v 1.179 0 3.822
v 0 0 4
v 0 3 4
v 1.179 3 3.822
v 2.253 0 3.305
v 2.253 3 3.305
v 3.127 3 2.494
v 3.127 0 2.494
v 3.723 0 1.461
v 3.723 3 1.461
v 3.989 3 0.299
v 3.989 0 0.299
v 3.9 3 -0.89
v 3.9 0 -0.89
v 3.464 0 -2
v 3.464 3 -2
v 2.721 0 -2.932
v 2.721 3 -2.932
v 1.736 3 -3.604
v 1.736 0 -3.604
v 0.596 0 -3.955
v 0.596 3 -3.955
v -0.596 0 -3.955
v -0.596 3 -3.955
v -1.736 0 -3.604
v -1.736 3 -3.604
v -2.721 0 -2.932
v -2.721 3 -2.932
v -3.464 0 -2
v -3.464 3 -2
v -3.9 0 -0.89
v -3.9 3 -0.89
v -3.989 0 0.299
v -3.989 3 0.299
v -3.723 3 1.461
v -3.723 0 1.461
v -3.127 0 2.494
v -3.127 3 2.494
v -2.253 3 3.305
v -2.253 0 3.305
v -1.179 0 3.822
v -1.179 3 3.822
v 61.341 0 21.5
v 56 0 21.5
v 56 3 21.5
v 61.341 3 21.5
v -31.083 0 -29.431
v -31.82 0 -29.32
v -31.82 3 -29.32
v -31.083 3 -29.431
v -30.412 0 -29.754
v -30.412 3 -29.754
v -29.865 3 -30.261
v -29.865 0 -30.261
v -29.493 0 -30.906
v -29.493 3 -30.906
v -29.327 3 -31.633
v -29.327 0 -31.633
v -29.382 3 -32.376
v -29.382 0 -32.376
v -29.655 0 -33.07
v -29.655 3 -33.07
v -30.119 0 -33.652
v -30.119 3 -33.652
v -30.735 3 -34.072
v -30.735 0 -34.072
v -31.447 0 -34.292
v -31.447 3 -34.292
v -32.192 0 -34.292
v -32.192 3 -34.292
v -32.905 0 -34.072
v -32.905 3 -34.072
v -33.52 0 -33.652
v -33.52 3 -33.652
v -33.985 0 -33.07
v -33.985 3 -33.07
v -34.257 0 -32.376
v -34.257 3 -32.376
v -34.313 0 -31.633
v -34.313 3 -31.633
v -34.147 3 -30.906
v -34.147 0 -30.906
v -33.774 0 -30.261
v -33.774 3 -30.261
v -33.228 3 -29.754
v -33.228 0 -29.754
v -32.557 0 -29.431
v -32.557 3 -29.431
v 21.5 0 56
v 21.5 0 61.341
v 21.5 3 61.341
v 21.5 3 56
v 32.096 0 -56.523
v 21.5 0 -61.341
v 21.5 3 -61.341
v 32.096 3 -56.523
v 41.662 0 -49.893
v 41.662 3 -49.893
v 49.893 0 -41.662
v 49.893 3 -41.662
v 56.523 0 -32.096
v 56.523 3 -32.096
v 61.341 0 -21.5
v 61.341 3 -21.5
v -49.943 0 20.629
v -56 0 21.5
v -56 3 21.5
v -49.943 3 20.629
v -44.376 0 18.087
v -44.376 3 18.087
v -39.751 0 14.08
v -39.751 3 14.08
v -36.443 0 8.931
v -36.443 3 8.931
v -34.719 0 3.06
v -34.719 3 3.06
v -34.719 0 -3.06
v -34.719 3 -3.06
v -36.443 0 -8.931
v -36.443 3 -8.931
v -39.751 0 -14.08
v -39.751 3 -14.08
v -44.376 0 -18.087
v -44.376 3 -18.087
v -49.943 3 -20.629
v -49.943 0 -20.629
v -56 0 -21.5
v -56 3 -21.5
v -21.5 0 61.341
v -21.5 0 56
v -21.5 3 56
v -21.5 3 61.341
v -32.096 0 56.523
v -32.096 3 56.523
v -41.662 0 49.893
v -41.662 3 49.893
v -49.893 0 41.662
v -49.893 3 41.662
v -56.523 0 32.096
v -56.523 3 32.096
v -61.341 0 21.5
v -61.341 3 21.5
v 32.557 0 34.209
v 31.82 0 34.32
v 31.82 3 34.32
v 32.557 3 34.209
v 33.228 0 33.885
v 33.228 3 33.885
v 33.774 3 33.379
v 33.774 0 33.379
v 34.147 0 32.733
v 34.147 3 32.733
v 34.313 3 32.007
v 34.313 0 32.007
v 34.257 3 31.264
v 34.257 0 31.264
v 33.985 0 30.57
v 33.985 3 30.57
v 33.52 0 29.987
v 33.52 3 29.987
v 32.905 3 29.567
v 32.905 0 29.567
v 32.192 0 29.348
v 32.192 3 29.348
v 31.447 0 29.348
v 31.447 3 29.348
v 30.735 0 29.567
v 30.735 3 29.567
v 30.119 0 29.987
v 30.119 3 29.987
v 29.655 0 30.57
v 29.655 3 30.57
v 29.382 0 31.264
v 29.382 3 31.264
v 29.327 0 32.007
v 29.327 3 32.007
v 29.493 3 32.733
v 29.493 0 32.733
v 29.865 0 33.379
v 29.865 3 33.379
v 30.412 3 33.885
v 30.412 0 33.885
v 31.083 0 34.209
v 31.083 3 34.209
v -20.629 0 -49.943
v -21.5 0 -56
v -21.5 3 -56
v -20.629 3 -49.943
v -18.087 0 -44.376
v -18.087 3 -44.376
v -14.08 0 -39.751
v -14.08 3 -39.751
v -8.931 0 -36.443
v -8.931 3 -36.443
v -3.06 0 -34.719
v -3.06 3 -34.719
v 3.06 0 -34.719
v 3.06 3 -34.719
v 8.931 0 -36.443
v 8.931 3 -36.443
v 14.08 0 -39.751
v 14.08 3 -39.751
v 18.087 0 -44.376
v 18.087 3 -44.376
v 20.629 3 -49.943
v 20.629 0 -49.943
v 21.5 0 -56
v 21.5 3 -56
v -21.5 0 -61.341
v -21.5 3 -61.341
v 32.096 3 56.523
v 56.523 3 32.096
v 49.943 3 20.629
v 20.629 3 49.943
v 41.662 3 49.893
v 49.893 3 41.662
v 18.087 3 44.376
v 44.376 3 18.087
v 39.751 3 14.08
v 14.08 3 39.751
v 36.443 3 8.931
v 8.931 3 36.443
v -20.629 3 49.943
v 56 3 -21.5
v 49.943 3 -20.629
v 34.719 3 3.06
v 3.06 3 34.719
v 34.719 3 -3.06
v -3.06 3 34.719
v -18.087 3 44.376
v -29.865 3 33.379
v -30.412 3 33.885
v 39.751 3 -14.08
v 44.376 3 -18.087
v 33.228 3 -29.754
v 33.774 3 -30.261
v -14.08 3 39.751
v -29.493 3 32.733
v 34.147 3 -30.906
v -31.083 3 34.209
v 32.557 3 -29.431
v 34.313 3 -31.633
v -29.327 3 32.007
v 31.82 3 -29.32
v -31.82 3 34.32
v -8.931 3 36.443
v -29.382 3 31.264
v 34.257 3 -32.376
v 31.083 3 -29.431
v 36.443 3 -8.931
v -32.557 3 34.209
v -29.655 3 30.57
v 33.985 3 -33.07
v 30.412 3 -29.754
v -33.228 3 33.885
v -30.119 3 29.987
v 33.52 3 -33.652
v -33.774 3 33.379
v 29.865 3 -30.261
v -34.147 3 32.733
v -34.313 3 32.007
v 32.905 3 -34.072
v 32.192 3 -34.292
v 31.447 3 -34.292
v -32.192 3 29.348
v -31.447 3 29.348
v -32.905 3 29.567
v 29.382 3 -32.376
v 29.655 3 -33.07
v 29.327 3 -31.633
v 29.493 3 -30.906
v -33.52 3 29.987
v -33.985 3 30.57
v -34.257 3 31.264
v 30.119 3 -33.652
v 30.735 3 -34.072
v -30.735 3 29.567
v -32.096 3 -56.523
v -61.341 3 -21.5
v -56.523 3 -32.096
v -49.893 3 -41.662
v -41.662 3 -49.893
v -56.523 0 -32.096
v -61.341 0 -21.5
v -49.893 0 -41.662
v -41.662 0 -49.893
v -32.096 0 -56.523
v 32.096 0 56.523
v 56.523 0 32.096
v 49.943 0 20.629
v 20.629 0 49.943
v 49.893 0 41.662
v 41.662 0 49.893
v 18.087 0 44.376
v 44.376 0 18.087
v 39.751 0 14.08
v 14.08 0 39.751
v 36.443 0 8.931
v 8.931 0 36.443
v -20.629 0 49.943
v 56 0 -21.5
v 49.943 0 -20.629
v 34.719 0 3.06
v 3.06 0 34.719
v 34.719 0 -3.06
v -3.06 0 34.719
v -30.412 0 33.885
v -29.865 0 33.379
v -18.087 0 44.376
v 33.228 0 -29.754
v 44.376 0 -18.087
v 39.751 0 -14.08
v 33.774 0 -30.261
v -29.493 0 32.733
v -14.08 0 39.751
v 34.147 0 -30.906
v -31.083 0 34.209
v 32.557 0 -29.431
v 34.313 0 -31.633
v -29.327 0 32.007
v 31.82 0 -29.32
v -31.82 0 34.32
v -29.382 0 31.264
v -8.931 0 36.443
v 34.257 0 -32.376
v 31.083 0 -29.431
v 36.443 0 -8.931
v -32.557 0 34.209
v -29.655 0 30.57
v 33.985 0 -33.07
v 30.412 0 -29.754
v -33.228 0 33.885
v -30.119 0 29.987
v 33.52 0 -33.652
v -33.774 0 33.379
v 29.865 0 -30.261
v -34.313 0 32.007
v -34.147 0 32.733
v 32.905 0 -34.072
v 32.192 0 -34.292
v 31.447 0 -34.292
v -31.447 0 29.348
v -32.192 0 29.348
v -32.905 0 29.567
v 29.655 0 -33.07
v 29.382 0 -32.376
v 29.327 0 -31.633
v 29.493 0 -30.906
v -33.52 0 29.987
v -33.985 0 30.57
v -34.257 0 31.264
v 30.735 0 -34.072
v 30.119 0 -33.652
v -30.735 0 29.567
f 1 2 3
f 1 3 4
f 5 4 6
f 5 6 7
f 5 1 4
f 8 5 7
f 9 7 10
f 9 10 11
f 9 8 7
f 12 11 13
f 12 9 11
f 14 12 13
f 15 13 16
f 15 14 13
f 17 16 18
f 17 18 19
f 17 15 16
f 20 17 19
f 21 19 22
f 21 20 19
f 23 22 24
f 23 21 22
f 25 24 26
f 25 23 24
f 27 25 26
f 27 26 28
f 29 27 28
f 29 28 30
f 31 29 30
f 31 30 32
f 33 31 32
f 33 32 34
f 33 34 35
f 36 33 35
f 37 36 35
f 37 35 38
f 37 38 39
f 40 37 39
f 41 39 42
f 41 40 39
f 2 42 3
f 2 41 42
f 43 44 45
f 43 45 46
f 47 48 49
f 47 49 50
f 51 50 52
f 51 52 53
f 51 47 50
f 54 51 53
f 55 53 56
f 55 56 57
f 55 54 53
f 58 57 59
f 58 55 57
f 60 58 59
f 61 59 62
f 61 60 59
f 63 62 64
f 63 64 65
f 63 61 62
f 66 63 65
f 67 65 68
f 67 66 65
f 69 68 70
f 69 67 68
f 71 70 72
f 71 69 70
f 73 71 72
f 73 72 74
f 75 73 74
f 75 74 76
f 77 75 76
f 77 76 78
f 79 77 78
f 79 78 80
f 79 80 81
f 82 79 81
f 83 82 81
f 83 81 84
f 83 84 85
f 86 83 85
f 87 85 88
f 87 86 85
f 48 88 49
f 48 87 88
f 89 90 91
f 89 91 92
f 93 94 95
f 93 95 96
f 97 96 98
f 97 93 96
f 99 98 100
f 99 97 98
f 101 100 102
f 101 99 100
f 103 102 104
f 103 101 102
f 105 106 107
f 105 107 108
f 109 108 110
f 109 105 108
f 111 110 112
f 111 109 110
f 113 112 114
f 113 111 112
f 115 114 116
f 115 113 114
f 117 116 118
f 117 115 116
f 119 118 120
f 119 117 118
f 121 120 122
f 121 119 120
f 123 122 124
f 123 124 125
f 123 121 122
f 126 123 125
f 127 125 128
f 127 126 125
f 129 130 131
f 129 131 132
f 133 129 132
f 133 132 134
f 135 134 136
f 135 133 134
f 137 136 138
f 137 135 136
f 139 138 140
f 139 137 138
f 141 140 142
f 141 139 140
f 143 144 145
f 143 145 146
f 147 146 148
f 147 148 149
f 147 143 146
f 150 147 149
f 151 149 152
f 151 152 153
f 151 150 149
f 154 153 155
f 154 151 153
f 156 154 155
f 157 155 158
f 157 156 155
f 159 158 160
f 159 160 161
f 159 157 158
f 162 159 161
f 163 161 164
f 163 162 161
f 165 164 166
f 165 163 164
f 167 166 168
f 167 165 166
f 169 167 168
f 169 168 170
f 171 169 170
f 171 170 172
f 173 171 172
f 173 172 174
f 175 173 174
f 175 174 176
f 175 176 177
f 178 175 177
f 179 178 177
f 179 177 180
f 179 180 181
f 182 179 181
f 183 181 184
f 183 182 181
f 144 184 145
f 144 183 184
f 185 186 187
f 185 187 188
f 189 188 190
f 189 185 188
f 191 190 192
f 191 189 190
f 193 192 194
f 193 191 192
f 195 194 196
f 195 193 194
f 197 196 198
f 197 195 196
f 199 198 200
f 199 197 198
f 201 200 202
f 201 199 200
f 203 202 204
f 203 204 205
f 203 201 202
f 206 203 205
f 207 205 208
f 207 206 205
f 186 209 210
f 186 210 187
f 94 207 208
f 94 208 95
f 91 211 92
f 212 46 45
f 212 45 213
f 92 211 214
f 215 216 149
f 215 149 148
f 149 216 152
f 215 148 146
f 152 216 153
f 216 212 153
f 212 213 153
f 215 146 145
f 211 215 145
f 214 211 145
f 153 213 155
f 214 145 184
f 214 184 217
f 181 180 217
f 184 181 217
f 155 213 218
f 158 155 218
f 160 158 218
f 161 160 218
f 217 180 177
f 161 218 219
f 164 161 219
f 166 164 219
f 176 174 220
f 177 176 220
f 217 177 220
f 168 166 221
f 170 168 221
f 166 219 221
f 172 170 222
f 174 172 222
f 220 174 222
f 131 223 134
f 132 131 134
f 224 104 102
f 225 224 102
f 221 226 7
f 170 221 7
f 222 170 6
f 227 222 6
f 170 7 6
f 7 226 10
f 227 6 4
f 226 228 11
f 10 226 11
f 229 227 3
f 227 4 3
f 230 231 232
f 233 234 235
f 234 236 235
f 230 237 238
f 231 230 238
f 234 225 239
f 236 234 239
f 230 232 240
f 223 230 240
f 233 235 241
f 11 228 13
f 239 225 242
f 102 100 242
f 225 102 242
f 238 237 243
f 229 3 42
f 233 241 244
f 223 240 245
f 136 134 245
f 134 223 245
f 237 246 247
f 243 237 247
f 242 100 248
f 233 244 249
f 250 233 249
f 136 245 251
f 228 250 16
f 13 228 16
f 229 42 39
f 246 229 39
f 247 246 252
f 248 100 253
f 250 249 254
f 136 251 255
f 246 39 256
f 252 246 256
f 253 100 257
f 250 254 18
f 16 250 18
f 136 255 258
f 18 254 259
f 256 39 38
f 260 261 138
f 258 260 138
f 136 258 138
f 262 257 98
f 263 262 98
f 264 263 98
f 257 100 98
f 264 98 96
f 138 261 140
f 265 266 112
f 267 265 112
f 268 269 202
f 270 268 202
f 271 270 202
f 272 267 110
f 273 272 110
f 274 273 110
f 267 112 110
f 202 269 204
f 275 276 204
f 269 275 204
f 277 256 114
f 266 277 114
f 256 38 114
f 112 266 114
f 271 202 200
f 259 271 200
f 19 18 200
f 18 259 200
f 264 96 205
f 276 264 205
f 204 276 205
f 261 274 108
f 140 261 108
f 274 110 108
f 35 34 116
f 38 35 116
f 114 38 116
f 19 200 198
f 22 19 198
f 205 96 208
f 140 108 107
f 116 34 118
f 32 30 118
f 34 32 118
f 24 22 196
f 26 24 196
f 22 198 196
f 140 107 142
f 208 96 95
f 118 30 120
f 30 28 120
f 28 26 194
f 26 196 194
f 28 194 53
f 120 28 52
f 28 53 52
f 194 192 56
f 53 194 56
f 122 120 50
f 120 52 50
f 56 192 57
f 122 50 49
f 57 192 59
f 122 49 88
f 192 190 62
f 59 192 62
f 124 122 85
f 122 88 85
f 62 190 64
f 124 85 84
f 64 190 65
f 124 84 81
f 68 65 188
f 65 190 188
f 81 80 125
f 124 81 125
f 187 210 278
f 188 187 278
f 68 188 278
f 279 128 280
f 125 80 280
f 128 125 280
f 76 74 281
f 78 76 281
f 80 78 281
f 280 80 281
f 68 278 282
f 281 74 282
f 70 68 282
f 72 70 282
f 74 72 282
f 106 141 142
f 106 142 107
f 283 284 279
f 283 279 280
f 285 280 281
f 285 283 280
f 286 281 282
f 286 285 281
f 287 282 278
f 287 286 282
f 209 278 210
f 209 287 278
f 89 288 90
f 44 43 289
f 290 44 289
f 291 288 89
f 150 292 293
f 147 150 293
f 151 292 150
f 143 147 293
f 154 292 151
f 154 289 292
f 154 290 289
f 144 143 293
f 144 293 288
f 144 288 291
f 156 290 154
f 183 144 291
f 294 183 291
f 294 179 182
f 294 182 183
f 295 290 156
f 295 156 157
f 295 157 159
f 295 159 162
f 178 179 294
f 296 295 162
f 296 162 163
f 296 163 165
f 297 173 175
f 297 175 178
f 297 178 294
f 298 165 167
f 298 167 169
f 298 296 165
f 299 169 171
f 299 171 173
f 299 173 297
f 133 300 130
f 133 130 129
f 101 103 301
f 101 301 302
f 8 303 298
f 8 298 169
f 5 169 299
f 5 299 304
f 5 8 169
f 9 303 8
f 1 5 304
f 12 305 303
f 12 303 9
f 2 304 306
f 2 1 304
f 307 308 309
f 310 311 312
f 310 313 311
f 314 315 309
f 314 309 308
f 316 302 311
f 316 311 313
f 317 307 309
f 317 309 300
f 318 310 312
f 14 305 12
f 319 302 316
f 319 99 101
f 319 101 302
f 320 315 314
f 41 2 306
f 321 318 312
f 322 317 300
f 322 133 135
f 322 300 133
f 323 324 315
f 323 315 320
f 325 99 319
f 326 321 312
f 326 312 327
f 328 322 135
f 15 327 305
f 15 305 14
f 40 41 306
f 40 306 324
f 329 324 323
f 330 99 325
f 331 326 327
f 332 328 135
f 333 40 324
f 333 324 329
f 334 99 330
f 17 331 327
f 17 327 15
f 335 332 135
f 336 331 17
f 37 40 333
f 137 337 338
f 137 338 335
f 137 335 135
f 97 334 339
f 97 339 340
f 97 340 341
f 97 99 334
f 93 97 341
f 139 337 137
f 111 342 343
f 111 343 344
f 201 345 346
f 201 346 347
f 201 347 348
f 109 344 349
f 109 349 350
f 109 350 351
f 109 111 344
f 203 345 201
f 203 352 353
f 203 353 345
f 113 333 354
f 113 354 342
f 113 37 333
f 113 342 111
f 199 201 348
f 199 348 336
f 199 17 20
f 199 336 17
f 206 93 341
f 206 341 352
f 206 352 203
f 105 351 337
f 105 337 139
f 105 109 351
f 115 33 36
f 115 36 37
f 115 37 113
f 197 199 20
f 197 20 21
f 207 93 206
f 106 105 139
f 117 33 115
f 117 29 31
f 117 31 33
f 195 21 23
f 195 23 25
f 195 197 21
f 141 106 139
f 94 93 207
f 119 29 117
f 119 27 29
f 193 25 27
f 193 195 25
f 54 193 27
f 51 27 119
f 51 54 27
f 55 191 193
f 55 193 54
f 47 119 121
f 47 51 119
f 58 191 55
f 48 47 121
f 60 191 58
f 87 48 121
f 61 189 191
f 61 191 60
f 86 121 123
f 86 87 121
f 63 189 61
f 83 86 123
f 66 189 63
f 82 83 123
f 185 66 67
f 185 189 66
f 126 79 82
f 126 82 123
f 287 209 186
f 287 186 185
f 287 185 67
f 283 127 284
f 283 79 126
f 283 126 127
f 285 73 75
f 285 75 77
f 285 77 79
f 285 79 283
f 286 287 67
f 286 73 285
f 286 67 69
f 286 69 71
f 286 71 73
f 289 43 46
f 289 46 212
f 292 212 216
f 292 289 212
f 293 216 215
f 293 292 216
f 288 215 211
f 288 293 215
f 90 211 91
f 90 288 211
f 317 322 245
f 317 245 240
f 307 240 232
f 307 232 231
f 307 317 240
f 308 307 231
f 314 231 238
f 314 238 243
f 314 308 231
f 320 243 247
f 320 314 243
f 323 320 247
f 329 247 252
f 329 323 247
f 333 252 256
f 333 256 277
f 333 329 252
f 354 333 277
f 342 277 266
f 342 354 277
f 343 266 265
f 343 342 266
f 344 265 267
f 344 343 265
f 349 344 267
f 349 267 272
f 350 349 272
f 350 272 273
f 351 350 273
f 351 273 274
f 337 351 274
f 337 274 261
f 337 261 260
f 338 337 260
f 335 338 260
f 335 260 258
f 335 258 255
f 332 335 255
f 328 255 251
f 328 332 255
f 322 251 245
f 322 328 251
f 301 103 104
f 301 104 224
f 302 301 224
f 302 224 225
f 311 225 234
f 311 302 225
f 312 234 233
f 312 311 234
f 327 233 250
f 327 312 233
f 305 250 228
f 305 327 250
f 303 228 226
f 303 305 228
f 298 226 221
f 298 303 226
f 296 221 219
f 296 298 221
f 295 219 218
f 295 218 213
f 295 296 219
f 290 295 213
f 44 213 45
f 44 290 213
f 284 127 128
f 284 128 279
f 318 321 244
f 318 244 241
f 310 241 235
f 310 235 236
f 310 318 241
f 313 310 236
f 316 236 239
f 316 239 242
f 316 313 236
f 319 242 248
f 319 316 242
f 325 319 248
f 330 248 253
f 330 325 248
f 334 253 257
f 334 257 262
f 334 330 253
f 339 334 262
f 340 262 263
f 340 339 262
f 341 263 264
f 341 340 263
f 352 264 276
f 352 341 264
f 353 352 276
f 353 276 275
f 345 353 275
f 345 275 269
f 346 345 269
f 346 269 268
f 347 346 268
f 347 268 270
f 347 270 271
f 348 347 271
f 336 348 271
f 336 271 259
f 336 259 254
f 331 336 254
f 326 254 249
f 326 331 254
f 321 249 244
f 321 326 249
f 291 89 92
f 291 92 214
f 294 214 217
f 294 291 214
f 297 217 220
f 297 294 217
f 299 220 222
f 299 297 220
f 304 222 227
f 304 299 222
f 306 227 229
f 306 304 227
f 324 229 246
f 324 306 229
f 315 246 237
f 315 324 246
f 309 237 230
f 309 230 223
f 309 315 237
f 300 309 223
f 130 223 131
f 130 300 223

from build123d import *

# Parameters (mm, degrees)
SKETCH1_R           = 4
SKETCH1_R_2         = 2.5
BOSS_EXTRUDE1_DEPTH = 3


with BuildPart() as part:
    # Sketch1 → Boss-Extrude1 (new body)
    with BuildSketch(Plane(origin=(0, 0, 0), x_dir=(1, 0, 0), z_dir=(0, 1, 0))):
        with BuildLine():
            Line((-56, 21.5), (-61.341258546, 21.5))
            ThreePointArc((-61.341258546, 21.5), (-45.961940777, 45.961940777), (-21.5, 61.341258546))
            Line((-21.5, 61.341258546), (-21.5, 56))
            ThreePointArc((-21.5, 56), (0, 34.5), (21.5, 56))
            Line((21.5, 56), (21.5, 61.341258546))
            ThreePointArc((21.5, 61.341258546), (45.961940777, 45.961940777), (61.341258546, 21.5))
            Line((61.341258546, 21.5), (56, 21.5))
            ThreePointArc((56, 21.5), (34.5, 0), (56, -21.5))
            Line((56, -21.5), (61.341258546, -21.5))
            ThreePointArc((61.341258546, -21.5), (45.961940777, -45.961940777), (21.5, -61.341258546))
            Line((21.5, -61.341258546), (21.5, -56))
            ThreePointArc((21.5, -56), (0, -34.5), (-21.5, -56))
            Line((-21.5, -56), (-21.5, -61.341258546))
            ThreePointArc((-21.5, -61.341258546), (-45.961940777, -45.961940777), (-61.341258546, -21.5))
            Line((-61.341258546, -21.5), (-56, -21.5))
            ThreePointArc((-56, -21.5), (-34.5, 0), (-56, 21.5))
        make_face()
        with Locations(Location((0, 0, 0), (0, 0, 270))):
            Circle(SKETCH1_R, mode=Mode.SUBTRACT)
        with Locations(Location((-31.819805153, 31.819805153, 0), (0, 0, 270))):
            Circle(SKETCH1_R_2, mode=Mode.SUBTRACT)
        with Locations(Location((31.819805153, 31.819805153, 0), (0, 0, 270))):
            Circle(SKETCH1_R_2, mode=Mode.SUBTRACT)
        with Locations(Location((31.819805153, -31.819805153, 0), (0, 0, 270))):
            Circle(SKETCH1_R_2, mode=Mode.SUBTRACT)
        with Locations(Location((-31.819805153, -31.819805153, 0), (0, 0, 270))):
            Circle(SKETCH1_R_2, mode=Mode.SUBTRACT)
    extrude(amount=BOSS_EXTRUDE1_DEPTH)


solid = part.part
